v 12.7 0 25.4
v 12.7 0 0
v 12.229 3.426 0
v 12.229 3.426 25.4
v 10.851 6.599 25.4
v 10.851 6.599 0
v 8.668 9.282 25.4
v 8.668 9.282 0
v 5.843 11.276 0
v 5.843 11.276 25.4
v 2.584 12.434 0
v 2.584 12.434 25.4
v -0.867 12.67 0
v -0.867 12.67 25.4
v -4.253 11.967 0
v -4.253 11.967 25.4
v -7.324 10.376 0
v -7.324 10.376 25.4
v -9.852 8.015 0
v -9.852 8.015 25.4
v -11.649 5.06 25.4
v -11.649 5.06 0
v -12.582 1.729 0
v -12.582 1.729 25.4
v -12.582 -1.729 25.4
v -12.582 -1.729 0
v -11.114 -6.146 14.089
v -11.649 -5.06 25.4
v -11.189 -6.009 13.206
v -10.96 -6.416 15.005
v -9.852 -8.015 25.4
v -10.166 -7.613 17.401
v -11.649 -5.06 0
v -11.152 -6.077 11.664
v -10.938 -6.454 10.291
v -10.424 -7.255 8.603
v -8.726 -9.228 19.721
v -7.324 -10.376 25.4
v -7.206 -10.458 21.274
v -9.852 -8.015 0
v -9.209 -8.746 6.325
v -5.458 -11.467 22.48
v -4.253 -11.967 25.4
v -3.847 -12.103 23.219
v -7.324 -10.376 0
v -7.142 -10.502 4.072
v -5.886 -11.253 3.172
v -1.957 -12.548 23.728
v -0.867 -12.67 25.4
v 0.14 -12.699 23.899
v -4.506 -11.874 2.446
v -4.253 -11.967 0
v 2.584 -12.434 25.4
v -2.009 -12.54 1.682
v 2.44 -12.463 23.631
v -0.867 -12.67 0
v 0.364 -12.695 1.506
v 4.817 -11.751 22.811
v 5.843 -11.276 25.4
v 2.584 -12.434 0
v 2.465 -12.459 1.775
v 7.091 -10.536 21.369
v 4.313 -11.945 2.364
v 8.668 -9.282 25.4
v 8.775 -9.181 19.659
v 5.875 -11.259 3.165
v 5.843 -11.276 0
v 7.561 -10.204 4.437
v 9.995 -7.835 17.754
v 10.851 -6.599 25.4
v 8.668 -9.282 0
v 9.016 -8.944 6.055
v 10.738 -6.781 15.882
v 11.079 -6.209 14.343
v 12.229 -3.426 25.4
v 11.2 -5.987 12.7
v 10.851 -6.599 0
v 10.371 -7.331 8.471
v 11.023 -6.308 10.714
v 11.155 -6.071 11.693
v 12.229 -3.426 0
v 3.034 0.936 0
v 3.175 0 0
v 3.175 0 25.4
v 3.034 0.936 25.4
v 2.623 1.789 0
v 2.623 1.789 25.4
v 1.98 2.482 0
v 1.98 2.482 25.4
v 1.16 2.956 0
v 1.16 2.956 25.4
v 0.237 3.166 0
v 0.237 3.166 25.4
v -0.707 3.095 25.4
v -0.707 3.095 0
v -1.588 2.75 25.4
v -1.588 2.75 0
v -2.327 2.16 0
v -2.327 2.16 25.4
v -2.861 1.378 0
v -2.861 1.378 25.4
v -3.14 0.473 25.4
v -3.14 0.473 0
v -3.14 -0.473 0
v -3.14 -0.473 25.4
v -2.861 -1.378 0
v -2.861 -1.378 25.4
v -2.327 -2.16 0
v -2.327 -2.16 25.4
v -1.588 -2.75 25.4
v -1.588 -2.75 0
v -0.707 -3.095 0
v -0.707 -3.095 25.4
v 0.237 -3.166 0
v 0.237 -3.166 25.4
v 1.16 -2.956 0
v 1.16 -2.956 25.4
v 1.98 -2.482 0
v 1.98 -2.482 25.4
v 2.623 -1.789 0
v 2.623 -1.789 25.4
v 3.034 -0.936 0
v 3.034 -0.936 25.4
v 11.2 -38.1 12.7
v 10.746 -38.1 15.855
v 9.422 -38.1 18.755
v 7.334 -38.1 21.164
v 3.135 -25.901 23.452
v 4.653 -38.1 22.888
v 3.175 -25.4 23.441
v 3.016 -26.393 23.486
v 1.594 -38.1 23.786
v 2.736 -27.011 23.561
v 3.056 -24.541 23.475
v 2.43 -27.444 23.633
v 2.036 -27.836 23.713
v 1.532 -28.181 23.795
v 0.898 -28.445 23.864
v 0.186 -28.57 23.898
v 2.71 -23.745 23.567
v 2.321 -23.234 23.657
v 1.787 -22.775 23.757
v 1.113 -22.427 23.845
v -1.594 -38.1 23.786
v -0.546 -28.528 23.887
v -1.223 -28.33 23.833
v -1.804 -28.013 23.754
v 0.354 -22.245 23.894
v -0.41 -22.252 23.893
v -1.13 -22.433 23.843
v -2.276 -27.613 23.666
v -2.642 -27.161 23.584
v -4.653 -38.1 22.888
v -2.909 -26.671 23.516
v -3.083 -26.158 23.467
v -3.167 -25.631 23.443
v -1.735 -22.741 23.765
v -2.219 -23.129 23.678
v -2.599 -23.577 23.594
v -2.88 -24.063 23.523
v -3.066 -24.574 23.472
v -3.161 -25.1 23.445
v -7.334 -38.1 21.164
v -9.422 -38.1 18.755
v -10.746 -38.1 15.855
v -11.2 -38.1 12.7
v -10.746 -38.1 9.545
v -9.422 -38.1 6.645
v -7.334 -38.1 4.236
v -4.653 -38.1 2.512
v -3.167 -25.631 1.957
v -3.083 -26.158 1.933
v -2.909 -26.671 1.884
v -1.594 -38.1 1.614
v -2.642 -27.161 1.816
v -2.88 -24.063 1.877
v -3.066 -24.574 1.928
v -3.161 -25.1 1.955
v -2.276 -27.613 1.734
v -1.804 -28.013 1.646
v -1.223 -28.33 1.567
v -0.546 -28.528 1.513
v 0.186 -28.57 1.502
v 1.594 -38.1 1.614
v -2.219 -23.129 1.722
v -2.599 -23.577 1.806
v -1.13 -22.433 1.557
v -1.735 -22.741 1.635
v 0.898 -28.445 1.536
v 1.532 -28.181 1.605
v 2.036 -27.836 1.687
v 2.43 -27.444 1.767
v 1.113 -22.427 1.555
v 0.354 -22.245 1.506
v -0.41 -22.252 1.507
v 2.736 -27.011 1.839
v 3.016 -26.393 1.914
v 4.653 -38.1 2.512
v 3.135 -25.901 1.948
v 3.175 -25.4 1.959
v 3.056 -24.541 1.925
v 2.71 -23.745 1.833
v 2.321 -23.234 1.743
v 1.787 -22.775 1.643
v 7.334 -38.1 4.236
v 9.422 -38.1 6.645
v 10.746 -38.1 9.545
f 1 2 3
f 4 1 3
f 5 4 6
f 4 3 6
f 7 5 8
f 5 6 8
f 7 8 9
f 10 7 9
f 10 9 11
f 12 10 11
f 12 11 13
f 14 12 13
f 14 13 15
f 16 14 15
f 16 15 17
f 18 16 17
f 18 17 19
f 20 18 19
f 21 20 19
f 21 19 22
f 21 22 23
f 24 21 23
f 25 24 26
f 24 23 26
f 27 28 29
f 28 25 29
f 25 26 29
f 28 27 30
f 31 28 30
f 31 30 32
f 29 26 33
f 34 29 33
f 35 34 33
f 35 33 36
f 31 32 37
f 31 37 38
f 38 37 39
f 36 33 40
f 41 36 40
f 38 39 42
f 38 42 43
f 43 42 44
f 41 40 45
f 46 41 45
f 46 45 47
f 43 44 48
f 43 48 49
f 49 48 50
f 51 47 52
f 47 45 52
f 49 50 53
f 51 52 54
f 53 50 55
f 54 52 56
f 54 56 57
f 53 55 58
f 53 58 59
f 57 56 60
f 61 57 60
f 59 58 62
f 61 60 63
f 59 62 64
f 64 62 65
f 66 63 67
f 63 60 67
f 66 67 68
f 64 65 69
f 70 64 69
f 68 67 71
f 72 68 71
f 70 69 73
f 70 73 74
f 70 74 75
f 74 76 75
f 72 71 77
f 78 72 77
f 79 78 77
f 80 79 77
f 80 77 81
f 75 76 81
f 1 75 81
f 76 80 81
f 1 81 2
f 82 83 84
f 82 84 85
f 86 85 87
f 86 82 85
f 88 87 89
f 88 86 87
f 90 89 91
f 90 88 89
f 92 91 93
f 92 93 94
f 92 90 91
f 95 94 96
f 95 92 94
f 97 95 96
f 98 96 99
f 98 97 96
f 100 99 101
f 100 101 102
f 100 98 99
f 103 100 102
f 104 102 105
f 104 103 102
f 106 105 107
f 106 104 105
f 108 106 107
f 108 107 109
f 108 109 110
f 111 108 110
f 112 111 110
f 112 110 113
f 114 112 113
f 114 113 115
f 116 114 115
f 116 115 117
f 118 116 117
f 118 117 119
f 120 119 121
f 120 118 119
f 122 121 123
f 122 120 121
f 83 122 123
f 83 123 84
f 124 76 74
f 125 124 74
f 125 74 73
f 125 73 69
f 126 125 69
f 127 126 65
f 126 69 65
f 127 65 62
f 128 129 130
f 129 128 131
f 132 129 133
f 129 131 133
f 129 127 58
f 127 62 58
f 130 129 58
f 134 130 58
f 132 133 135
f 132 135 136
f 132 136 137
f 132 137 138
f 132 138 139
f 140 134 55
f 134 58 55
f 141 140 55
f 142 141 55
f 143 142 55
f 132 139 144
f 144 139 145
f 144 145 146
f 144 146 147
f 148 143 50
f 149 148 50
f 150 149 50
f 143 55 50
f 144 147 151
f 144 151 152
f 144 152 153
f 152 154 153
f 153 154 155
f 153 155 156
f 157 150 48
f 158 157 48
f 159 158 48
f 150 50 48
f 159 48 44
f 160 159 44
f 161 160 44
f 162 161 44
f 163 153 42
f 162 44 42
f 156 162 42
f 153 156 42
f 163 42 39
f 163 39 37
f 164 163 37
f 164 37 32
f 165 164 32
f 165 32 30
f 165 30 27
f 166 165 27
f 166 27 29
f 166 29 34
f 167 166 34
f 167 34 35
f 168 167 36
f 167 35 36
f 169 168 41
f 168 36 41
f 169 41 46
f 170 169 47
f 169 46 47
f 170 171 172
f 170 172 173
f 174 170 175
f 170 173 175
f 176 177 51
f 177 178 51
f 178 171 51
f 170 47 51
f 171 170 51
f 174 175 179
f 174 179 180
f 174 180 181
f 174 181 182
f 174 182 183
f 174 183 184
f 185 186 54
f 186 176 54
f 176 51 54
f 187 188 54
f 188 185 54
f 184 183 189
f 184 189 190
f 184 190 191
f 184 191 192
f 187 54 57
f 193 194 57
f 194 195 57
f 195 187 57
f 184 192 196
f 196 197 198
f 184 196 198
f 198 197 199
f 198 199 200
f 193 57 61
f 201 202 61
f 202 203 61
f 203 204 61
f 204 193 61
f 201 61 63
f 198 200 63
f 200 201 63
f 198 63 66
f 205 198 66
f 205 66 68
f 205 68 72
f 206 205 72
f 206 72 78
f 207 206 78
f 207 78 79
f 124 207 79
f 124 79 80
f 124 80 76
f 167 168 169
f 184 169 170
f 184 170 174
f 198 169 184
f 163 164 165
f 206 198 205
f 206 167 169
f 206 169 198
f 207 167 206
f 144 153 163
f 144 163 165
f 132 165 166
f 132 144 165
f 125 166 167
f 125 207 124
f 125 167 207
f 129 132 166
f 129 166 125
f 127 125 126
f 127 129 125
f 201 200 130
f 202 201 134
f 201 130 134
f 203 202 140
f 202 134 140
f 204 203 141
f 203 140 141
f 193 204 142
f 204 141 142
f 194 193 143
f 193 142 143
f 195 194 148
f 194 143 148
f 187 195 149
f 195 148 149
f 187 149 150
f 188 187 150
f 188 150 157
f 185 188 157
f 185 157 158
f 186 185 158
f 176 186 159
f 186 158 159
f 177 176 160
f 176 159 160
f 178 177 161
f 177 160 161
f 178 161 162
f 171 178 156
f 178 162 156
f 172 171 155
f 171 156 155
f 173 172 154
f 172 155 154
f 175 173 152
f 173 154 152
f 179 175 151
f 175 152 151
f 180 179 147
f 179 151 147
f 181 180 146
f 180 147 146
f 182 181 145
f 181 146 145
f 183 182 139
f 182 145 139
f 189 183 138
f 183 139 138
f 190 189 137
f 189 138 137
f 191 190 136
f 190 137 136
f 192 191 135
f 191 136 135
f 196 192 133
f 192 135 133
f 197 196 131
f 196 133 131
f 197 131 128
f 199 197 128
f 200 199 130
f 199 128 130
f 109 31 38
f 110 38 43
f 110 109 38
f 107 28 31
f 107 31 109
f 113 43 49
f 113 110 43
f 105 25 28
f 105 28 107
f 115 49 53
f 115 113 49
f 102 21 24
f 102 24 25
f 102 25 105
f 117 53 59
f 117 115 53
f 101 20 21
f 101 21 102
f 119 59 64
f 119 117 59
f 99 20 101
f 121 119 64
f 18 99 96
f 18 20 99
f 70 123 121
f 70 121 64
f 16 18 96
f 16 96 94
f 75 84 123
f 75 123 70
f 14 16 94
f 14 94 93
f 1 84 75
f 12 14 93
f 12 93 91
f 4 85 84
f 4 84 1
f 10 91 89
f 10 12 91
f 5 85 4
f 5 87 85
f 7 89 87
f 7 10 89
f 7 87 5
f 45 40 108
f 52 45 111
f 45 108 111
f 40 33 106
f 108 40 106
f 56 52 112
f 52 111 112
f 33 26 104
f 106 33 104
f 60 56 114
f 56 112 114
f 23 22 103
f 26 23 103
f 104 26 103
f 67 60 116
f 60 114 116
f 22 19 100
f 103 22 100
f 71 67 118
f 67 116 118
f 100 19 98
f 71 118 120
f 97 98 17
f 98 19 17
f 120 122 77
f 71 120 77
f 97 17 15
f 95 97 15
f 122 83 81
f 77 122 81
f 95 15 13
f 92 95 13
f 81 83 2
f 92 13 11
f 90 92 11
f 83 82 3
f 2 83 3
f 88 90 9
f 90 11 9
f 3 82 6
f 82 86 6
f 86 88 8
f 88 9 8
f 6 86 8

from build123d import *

# Parameters (mm, degrees)
F0_R          = 12.7
F1_DEPTH      = 25.4
F2_R          = 11.2
F3_DEPTH      = 38.1
F4_R          = 3.175
F5_DEPTH      = 25.4
F5_DEPTH_BACK = 25.4
F7_R          = 3.175
F8_DEPTH      = 12.7


with BuildPart() as f1:
    # F0 (on Top) → F1 (new body)
    with BuildSketch(Plane.XY):
        Circle(F0_R)
    extrude(amount=F1_DEPTH)

    # F2 (on Front) → F3 (join)
    with BuildSketch(Plane.XZ):
        with Locations((0, 12.7)):
            Circle(F2_R)
    extrude(amount=F3_DEPTH)

    # F4 (on Top) → F5 (cut, two sides)
    with BuildSketch(Plane.XY) as f5_sk:
        Circle(F4_R)
    extrude(amount=-F5_DEPTH, mode=Mode.SUBTRACT)
    extrude(f5_sk.sketch, amount=F5_DEPTH_BACK, mode=Mode.SUBTRACT)

    # F7 (on offset) → F8 (cut, symmetric)
    with BuildSketch(Plane.XY.offset(12.7)):
        with Locations((0, -25.4)):
            Circle(F7_R)
    extrude(amount=F8_DEPTH, both=True, mode=Mode.SUBTRACT)


solid = f1.part
